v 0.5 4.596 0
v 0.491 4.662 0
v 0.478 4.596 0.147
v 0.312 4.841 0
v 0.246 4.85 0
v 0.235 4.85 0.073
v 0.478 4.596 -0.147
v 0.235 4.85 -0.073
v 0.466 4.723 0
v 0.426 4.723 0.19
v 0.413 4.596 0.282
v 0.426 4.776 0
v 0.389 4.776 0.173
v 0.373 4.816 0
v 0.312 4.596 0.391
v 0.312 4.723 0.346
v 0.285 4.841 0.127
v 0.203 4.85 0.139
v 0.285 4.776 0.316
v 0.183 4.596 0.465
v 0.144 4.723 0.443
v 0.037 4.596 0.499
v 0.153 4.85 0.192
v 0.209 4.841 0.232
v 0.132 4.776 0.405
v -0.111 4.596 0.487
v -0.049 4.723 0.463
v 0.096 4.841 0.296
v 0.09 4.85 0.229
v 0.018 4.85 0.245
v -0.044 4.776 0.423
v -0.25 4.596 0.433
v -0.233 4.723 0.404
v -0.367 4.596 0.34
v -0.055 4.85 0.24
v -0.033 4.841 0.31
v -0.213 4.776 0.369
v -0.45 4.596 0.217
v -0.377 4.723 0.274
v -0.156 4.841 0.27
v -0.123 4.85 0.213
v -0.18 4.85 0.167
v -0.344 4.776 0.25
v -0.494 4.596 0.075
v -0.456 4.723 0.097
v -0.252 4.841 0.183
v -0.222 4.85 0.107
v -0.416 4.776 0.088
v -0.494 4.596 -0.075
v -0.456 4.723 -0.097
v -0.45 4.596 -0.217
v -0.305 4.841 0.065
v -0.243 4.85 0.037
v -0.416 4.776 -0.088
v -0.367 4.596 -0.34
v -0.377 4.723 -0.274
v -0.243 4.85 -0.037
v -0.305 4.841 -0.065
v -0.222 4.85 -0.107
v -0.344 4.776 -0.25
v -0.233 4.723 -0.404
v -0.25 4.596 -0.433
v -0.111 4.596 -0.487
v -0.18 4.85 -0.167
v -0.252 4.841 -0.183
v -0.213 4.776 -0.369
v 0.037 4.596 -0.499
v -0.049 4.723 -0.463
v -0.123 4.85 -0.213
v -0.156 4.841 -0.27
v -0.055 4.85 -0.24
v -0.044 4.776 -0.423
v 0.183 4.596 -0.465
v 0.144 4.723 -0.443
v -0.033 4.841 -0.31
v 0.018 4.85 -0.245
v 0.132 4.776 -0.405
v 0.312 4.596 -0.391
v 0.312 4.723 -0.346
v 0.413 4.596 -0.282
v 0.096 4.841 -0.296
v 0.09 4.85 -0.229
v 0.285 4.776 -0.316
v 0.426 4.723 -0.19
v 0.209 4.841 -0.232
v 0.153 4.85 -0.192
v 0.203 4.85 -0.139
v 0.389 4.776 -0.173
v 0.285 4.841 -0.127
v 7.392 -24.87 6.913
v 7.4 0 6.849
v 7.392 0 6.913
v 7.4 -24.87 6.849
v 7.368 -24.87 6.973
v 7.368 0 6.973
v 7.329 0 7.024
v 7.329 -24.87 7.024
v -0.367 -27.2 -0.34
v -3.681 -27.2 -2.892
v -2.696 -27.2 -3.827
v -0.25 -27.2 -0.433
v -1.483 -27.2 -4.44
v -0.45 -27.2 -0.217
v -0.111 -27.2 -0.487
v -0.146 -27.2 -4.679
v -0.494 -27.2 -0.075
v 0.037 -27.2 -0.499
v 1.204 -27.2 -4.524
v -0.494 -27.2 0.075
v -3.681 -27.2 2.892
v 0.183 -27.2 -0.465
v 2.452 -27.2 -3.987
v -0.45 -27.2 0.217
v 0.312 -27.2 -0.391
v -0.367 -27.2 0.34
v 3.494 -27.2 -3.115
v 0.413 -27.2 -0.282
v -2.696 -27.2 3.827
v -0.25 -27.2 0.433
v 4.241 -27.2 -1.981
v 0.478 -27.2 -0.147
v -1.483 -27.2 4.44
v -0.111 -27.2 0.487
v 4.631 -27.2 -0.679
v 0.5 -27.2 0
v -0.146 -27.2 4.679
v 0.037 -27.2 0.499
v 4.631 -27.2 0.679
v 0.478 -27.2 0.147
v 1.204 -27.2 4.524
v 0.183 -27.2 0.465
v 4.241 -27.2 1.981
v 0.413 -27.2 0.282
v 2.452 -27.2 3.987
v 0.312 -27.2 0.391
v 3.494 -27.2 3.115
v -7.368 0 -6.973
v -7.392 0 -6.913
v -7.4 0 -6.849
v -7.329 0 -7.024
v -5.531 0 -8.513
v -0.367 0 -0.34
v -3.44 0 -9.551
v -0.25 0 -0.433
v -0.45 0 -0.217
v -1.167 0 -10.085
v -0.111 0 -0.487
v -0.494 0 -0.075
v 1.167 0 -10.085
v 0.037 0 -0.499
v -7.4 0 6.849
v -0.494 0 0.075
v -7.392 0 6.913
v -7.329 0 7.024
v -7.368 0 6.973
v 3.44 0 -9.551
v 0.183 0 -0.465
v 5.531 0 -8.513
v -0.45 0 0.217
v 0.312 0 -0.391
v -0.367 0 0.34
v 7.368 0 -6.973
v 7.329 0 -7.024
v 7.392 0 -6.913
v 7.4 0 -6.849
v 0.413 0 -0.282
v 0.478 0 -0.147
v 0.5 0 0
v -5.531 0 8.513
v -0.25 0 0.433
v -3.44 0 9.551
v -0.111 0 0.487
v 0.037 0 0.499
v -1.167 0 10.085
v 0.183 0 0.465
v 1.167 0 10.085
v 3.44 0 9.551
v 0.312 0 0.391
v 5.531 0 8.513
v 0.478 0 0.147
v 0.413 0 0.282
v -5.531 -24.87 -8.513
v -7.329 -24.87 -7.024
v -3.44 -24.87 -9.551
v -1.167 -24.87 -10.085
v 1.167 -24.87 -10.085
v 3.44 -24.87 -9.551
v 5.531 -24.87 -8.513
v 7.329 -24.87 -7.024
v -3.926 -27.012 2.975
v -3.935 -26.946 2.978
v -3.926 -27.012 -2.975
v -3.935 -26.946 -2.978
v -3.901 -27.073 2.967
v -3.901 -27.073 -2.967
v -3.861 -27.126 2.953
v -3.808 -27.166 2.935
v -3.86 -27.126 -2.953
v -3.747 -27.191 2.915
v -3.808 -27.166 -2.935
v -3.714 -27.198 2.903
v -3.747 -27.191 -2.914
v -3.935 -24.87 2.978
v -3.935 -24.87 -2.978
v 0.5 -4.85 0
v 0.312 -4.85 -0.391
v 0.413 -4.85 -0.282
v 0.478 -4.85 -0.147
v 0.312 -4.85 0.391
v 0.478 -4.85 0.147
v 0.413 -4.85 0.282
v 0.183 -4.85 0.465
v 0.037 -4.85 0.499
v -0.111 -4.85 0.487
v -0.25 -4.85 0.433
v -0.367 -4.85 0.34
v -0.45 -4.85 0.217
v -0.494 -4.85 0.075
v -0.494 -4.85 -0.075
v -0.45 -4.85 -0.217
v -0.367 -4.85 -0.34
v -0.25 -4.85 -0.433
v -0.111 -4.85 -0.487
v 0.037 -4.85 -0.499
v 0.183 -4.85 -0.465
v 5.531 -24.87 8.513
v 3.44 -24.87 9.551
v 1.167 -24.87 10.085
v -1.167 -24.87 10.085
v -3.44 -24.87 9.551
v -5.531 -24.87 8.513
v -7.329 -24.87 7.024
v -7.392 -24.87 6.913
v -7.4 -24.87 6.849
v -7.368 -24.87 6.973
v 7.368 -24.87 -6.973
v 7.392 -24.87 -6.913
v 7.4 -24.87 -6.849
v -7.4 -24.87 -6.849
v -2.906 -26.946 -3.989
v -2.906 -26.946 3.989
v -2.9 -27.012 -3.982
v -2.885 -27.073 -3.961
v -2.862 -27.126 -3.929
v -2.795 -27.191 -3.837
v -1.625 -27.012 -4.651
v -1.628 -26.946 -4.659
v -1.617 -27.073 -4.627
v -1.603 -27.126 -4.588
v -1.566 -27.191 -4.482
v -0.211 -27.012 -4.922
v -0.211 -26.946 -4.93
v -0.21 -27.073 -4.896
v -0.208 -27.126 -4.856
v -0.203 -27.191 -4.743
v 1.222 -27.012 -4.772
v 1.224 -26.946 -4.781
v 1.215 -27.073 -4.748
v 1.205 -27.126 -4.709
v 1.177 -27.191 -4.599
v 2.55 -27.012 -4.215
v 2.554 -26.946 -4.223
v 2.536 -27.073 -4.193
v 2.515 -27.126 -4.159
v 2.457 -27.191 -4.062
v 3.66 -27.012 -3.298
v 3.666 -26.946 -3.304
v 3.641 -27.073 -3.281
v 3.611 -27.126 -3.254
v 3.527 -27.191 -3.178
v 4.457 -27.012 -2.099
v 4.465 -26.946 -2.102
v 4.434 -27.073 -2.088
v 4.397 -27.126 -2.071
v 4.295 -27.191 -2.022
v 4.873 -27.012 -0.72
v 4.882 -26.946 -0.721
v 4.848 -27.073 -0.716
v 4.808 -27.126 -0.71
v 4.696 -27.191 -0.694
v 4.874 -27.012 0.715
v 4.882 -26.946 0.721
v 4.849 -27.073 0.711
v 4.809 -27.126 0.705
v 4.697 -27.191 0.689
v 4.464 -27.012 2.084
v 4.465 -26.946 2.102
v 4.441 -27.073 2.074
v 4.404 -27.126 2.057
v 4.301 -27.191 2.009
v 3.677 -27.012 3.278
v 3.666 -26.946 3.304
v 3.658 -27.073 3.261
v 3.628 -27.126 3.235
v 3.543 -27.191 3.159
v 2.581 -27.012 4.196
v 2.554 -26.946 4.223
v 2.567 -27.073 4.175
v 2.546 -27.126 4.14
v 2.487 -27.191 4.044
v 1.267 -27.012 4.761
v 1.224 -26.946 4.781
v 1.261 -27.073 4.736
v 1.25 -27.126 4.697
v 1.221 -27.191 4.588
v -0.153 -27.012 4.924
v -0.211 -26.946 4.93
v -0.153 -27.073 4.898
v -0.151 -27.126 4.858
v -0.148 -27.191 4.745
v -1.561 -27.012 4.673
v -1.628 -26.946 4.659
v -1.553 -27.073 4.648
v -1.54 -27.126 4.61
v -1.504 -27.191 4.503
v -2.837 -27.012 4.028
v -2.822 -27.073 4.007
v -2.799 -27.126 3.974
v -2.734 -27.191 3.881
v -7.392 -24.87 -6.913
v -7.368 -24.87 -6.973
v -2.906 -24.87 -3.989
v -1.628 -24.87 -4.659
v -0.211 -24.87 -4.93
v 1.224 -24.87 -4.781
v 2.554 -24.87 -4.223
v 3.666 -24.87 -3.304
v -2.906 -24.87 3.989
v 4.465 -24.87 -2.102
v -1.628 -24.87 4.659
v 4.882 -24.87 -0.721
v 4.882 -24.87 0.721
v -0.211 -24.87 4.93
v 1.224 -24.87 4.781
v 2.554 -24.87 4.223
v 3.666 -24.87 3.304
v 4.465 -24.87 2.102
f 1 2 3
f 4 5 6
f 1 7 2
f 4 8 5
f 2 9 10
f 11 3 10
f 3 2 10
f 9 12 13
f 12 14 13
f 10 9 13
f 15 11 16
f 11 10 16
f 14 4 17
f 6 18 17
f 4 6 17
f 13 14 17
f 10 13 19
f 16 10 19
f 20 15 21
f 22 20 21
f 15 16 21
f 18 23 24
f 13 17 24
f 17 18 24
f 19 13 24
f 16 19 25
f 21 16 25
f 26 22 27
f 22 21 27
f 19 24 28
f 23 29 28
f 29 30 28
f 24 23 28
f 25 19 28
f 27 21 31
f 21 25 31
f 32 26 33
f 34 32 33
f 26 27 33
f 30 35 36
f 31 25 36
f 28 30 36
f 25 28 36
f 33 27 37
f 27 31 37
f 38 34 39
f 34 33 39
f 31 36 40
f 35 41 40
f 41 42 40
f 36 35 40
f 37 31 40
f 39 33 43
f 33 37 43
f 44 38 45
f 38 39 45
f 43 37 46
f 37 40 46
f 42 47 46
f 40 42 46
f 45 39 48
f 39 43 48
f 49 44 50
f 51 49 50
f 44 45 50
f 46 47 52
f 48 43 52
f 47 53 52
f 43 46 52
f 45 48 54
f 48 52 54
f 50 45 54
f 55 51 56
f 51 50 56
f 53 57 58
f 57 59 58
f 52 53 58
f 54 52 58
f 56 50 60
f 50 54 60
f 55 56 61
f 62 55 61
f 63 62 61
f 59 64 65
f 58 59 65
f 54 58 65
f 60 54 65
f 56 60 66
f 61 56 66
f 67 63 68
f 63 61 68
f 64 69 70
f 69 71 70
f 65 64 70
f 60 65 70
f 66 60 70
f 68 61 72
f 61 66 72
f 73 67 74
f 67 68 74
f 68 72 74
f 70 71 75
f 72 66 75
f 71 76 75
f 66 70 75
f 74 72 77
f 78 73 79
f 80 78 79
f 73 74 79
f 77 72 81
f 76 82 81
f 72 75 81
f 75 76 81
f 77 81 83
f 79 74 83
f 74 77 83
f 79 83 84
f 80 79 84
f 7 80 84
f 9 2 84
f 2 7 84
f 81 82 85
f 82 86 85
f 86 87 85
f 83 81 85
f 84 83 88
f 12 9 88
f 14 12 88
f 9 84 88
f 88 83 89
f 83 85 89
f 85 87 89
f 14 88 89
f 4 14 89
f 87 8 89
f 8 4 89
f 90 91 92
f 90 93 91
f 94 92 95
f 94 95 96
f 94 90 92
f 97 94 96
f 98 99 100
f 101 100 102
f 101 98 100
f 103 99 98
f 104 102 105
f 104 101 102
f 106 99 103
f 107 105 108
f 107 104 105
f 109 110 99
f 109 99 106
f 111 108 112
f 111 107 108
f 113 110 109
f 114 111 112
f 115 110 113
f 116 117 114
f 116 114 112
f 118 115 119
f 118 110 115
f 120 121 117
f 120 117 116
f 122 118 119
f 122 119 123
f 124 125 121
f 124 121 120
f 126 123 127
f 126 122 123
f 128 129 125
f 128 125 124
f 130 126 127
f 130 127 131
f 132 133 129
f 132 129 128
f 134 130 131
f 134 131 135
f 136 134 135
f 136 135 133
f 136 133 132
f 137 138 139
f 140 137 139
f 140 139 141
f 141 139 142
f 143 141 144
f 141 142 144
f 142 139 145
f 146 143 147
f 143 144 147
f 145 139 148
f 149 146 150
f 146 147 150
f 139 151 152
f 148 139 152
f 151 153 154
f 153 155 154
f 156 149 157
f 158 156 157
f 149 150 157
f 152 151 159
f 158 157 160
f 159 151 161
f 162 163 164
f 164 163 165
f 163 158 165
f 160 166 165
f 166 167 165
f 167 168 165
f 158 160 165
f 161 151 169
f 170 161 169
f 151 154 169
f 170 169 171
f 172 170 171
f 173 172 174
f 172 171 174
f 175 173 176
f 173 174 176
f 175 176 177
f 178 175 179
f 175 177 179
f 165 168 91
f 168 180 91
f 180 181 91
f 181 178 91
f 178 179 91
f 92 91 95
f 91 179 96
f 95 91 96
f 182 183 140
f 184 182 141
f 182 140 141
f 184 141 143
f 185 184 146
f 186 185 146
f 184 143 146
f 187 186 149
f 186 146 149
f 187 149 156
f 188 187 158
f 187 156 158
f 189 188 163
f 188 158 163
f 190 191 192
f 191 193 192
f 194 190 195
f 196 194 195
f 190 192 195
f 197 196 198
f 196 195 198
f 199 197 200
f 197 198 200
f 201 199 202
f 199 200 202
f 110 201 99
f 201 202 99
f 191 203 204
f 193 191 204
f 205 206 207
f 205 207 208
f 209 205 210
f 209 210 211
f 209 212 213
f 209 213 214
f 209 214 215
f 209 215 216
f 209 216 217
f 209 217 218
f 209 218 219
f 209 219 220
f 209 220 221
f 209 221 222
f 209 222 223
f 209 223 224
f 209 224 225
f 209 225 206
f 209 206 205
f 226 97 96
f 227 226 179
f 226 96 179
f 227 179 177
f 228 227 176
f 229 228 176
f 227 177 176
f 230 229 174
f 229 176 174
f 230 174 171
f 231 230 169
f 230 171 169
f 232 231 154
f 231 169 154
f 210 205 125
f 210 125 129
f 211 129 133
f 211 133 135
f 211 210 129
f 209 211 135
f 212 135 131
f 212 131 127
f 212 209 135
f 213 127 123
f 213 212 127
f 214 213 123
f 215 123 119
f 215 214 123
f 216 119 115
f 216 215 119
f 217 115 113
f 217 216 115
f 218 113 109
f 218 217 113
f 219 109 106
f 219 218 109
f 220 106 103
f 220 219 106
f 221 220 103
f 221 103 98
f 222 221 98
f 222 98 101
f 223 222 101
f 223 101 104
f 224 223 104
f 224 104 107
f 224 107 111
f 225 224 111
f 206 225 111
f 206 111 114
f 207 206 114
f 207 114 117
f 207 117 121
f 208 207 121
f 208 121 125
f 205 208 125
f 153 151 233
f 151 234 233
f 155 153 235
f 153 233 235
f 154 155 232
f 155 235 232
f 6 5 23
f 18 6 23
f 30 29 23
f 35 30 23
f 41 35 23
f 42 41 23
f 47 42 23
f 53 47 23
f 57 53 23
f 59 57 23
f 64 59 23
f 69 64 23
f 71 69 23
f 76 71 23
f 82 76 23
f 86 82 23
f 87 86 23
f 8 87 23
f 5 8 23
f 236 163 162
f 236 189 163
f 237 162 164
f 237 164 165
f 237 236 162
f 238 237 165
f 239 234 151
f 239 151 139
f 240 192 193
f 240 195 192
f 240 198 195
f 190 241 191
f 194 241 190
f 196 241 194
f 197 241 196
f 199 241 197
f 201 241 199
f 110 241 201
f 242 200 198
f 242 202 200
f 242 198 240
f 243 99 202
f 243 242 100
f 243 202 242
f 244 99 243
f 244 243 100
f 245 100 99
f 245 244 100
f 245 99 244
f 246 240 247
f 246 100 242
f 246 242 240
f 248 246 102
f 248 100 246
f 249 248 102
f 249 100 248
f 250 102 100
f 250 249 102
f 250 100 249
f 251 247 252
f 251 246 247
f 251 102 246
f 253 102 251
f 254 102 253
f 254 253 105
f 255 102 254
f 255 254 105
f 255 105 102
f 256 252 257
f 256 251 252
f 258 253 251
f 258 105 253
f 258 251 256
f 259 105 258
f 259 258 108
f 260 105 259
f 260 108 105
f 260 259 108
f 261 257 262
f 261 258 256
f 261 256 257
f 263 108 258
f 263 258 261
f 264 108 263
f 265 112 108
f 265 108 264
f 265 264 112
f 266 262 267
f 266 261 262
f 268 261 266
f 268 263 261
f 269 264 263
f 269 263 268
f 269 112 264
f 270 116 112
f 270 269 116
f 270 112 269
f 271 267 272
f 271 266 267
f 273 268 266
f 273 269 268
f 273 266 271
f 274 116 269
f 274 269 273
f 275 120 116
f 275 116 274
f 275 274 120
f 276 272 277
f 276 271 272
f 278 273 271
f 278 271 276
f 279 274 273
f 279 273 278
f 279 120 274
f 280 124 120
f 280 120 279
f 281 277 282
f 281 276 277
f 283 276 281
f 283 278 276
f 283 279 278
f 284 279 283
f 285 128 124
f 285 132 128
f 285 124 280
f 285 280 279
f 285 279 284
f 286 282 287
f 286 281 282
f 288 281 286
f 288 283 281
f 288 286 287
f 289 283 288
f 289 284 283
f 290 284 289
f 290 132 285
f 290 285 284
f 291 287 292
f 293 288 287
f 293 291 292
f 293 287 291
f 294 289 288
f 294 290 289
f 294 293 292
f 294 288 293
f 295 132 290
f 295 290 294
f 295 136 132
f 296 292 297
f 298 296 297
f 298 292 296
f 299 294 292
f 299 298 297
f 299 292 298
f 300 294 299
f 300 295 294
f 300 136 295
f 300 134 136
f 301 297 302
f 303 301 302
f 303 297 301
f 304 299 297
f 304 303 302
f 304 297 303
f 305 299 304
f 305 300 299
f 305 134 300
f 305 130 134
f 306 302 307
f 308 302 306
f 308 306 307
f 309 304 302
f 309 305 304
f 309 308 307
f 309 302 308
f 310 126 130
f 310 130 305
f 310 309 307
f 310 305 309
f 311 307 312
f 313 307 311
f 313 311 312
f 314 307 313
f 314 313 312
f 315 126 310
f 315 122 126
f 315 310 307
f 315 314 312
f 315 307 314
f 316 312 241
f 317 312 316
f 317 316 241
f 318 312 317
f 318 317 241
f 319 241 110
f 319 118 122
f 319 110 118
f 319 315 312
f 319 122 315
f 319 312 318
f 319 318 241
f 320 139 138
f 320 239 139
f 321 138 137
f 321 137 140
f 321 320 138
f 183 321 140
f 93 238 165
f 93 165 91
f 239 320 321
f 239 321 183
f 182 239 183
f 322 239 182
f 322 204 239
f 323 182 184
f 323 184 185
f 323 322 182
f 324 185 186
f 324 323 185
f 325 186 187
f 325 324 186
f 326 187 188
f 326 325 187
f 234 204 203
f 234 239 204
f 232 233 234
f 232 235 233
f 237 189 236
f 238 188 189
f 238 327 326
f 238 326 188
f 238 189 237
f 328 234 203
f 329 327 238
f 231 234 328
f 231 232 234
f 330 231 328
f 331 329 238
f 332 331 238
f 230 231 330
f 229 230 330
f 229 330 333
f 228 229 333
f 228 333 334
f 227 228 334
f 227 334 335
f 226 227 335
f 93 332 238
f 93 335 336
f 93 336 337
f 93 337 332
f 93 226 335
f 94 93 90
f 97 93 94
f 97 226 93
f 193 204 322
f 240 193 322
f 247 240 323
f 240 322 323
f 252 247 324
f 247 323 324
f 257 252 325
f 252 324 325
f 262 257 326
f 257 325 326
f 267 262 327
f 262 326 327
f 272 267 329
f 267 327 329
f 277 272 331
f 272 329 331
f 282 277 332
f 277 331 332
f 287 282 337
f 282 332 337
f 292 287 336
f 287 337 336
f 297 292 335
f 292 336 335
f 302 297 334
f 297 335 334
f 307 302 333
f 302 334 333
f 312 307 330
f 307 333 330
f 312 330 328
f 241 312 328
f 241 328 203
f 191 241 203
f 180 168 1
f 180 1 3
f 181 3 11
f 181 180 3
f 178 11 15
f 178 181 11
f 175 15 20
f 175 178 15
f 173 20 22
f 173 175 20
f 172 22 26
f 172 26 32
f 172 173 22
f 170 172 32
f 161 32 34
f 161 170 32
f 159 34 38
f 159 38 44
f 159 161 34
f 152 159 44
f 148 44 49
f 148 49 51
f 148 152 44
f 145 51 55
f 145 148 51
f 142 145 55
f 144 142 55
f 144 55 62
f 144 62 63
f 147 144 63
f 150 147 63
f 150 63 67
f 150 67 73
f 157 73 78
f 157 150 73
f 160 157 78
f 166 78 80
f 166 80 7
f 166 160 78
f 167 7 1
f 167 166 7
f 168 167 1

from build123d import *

# Parameters (mm, degrees)
F1_DEPTH = 24.87
F0_R     = 0.5
F2_DEPTH = 27.2
F3_DEPTH = 4.85
F4_R     = 0.254


with BuildPart() as f1:
    # F0 (on Front) → F1 (new body)
    with BuildSketch(Plane.XZ):
        with BuildLine():
            Line((-7.4, 6.95), (-7.4, -6.95))
            ThreePointArc((-7.4, -6.95), (0, -10.1519702521), (7.4, -6.95))
            Line((7.4, -6.95), (7.4, 6.95))
            ThreePointArc((7.4, 6.95), (0, 10.1519702521), (-7.4, 6.95))
        make_face()
        with BuildLine():
            ThreePointArc((-3.935, 2.9782545224), (4.935, 0), (-3.935, -2.9782545224))
            Line((-3.935, -2.9782545224), (-3.935, 2.9782545224))
        make_face(mode=Mode.SUBTRACT)
    extrude(amount=F1_DEPTH)

    # F0 (on Front) → F2 (join)
    with BuildSketch(Plane.XZ):
        with BuildLine():
            Line((-3.935, 2.9782545224), (-3.935, -2.9782545224))
            ThreePointArc((-3.935, -2.9782545224), (4.935, 0), (-3.935, 2.9782545224))
        make_face()
        Circle(F0_R, mode=Mode.SUBTRACT)
    extrude(amount=F2_DEPTH)

    # F0 (on Front) → F3 (join, symmetric)
    with BuildSketch(Plane.XZ):
        Circle(F0_R)
    extrude(amount=F3_DEPTH, both=True)

    # F4
    f4_edges = [f1.edges().sort_by_distance(p)[0] for p in [
        (-3.935, -27.2, 0),
        (4.935, -27.2, 0),
        (7.4, -12.435, -6.95),
        (7.4, -12.435, 6.95),
        (-7.4, -12.435, 6.95),
        (-7.4, -12.435, -6.95),
        (-0.5, 4.85, 0),
    ]]
    fillet(f4_edges, radius=F4_R)


solid = f1.part
